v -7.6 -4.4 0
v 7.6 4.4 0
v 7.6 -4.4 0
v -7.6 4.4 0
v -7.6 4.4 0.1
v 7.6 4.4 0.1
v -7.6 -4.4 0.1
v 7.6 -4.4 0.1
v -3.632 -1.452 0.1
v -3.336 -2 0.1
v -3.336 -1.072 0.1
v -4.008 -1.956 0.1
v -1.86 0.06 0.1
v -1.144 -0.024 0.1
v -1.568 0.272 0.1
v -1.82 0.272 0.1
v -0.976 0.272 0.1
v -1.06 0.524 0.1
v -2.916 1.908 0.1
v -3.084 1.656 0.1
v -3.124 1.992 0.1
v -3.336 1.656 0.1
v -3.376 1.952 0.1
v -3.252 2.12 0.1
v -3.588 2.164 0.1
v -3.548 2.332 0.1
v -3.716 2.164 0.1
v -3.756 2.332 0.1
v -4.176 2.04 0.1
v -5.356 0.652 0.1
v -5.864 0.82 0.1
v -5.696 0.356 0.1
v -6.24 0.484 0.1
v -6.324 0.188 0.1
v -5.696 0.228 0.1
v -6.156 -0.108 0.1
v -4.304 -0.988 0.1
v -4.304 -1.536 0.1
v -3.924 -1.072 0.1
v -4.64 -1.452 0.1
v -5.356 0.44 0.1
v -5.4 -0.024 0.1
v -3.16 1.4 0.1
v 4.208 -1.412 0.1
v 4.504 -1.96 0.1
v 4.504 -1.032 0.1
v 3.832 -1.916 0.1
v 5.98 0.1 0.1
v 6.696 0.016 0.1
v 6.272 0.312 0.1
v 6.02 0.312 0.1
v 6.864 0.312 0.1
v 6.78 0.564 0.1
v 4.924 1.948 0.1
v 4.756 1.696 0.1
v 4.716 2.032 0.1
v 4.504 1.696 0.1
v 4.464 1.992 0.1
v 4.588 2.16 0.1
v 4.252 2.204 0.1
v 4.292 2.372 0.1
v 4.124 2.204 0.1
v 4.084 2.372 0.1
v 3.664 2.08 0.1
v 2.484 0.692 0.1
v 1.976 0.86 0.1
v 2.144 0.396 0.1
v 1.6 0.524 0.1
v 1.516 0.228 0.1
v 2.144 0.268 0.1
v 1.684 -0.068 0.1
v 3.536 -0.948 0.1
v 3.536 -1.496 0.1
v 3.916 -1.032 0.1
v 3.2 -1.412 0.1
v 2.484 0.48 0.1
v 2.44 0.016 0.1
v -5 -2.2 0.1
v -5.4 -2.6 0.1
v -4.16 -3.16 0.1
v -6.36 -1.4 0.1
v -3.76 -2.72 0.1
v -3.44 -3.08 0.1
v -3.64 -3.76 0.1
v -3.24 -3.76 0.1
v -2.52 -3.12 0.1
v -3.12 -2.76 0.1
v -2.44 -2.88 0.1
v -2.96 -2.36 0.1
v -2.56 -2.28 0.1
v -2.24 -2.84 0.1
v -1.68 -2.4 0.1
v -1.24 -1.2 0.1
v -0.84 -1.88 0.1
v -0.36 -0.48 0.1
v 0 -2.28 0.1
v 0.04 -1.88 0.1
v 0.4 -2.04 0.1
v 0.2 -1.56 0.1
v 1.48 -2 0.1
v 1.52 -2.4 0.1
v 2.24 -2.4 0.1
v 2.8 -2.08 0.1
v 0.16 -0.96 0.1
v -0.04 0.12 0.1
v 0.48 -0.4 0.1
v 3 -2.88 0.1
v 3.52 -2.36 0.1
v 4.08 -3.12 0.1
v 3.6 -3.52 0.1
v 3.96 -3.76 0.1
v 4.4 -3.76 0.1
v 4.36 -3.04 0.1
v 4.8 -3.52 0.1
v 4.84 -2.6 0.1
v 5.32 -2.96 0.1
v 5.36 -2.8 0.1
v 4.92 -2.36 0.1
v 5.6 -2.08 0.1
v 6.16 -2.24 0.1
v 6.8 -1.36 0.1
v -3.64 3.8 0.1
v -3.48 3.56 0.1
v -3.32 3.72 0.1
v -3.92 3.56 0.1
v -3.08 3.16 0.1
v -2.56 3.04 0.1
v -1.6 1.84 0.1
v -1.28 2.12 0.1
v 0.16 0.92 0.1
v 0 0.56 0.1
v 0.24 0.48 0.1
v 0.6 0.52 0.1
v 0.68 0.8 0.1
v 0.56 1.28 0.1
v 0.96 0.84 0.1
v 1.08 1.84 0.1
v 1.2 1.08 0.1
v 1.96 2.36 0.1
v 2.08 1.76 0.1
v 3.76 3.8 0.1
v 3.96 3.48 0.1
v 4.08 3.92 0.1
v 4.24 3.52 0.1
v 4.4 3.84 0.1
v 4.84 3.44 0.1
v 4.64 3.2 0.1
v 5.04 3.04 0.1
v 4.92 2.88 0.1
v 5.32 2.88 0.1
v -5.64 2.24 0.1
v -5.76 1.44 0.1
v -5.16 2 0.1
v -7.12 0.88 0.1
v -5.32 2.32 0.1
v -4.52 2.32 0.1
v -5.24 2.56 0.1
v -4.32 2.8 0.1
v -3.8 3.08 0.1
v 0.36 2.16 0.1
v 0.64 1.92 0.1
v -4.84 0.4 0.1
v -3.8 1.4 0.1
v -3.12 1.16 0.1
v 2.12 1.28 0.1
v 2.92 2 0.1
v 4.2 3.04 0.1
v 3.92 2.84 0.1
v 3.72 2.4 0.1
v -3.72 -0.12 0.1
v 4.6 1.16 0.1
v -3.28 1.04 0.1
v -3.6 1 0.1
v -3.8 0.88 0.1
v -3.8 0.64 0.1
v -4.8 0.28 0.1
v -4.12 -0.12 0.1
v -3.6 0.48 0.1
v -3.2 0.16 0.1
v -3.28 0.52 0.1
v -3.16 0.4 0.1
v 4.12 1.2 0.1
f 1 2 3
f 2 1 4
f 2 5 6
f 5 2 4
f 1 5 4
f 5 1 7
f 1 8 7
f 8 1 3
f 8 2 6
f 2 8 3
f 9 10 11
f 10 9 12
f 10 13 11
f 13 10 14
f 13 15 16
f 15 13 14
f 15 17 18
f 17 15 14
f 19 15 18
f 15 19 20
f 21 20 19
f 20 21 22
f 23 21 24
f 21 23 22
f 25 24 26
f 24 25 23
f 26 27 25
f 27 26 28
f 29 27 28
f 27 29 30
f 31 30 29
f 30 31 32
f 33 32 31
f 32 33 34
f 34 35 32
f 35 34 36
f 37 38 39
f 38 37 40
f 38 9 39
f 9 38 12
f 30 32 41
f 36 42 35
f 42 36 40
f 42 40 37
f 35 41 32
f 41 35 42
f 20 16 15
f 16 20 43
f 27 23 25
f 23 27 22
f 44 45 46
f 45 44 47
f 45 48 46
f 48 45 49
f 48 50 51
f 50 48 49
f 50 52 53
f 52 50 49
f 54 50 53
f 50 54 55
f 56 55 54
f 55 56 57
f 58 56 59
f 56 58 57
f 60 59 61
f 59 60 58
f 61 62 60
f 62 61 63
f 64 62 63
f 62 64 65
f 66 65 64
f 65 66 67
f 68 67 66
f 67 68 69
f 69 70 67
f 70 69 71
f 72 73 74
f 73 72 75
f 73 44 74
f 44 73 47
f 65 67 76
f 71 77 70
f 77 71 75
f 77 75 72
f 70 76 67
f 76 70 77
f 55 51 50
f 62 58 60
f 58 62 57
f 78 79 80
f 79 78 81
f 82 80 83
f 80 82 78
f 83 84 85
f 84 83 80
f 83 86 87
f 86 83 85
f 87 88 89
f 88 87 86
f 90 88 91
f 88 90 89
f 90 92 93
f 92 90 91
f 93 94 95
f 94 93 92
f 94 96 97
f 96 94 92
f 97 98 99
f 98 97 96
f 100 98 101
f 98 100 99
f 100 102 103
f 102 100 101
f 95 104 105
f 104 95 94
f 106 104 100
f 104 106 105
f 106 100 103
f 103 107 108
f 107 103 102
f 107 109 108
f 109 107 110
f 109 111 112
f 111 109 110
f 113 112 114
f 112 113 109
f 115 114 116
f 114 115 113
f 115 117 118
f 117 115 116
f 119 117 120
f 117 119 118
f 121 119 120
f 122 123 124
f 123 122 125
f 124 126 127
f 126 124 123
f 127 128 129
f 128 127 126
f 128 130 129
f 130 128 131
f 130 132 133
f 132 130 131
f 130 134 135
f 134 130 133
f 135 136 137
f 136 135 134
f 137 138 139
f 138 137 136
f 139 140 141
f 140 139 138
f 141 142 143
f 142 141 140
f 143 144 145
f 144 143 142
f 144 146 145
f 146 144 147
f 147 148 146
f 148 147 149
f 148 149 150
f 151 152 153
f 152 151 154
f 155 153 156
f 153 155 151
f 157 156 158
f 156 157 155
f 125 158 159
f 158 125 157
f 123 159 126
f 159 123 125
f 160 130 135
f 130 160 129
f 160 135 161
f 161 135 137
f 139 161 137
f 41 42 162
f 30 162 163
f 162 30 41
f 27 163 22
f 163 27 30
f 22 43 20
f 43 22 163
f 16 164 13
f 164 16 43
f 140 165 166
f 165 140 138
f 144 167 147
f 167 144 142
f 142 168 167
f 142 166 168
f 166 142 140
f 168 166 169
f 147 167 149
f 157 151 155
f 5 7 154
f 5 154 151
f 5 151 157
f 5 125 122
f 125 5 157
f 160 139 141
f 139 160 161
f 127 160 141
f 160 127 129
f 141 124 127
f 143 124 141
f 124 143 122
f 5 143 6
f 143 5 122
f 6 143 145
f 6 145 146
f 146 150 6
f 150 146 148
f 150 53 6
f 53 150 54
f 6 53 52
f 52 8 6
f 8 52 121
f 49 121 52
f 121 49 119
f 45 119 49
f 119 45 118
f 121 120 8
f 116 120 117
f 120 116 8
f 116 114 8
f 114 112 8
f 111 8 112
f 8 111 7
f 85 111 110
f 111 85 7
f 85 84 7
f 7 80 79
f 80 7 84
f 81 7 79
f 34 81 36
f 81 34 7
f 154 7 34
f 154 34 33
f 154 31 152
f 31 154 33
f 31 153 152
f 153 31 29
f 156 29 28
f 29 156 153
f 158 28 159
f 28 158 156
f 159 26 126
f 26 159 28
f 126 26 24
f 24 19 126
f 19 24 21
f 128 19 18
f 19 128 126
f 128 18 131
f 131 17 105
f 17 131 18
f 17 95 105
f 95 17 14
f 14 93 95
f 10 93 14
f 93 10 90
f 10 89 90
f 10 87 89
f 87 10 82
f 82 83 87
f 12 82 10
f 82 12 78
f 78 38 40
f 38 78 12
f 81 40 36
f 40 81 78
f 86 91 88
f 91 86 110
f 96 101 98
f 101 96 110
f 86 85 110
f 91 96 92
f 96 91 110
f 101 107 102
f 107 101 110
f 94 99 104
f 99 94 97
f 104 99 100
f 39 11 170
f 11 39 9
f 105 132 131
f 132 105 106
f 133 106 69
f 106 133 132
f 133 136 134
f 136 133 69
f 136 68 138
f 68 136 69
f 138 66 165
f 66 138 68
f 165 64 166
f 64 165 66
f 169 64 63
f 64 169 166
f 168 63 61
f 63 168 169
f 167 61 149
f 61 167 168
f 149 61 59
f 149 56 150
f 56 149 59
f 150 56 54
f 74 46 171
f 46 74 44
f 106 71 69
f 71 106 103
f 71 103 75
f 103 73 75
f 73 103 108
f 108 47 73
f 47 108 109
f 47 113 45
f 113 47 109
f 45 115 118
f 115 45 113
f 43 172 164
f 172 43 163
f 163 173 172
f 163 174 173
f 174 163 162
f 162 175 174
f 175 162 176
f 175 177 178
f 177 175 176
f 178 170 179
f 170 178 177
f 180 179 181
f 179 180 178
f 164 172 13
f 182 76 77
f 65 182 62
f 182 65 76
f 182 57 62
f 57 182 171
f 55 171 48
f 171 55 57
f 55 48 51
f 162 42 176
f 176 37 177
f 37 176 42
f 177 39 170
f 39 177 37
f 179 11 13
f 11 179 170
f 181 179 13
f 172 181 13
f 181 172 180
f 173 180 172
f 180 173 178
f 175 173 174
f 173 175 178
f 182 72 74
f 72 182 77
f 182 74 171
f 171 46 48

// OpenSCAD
// file: ../p/box5-12.scad
use <../lib.scad>
function ldraw_lib__box5_12() = [
// 0 Box with 5 Faces without Any Edges
// 0 Name: box5-12.dat
// 0 Author: Chris Dee [cwdee]
// 0 !LDRAW_ORG Primitive UPDATE 2009-02
// 0 !LICENSE Licensed under CC BY 2.0 and CC BY 4.0 : see CAreadme.txt
// 
// 0 BFC CERTIFY CCW
  [0,"BFC","CERTIFY"],
  [0,"BFC","CCW"],
// 
// 0 !HISTORY 2009-09-03 [PTadmin] Official Update 2009-02
// 
// 
// 4 16 1 1 1 1 1 -1 -1 1 -1 -1 1 1
  [4,16,1,1,1,1,1,-1,-1,1,-1,-1,1,1],
// 4 16 -1 0 1 1 0 1 1 1 1 -1 1 1
  [4,16,-1,0,1,1,0,1,1,1,1,-1,1,1],
// 4 16 -1 0 -1 -1 0 1 -1 1 1 -1 1 -1
  [4,16,-1,0,-1,-1,0,1,-1,1,1,-1,1,-1],
// 4 16 1 0 -1 -1 0 -1 -1 1 -1 1 1 -1
  [4,16,1,0,-1,-1,0,-1,-1,1,-1,1,1,-1],
// 4 16 1 0 1 1 0 -1 1 1 -1 1 1 1
  [4,16,1,0,1,1,0,-1,1,1,-1,1,1,1],
// 0
];
makepoly(ldraw_lib__box5_12(), line=0.2);
// main file
use <../lib.scad>
use <../p/box5-12.scad>
function ldraw_lib__6005724h2() = [
// 0 Sticker  1.1 x  1.9 with Diamond Bricks Type 2
// 0 Name: 6005724h2.dat
// 0 Author: Christian Neumann [Wesley]
// 0 !LDRAW_ORG Part UPDATE 2014-02
// 0 !LICENSE Licensed under CC BY 2.0 and CC BY 4.0 : see CAreadme.txt
// 
// 0 BFC CERTIFY CCW
  [0,"BFC","CERTIFY"],
  [0,"BFC","CCW"],
// 
// 0 !KEYWORDS Lord of the Rings, LOTR, Mines of Moria, Set 9473
// 
// 0 !CMDLINE -c72
// 
// 0 !HISTORY 2014-12-23 [PTadmin] Official Update 2014-02
// 
// 
// 1 16 0 -0.25 0 19 0 0 0 0.25 0 0 0 11 box5-12.dat
  [1,16,0,-0.25,0,19,0,0,0,0.25,0,0,0,11, ldraw_lib__box5_12()],
// 4 0 -9.08 -0.25 -3.63 -10.02 -0.25 -4.89 -8.34 -0.25 -5 -8.34 -0.25 -2.68
  [4,0,-9.08,-0.25,-3.63,-10.02,-0.25,-4.89,-8.34,-0.25,-5,-8.34,-0.25,-2.68],
// 4 0 -4.65 -0.25 0.15 -8.34 -0.25 -2.68 -8.34 -0.25 -5 -2.86 -0.25 -0.06
  [4,0,-4.65,-0.25,0.15,-8.34,-0.25,-2.68,-8.34,-0.25,-5,-2.86,-0.25,-0.06],
// 4 0 -4.55 -0.25 0.68 -4.65 -0.25 0.15 -2.86 -0.25 -0.06 -3.92 -0.25 0.68
  [4,0,-4.55,-0.25,0.68,-4.65,-0.25,0.15,-2.86,-0.25,-0.06,-3.92,-0.25,0.68],
// 4 0 -3.92 -0.25 0.68 -2.86 -0.25 -0.06 -2.44 -0.25 0.68 -2.65 -0.25 1.31
  [4,0,-3.92,-0.25,0.68,-2.86,-0.25,-0.06,-2.44,-0.25,0.68,-2.65,-0.25,1.31],
// 4 0 -3.92 -0.25 0.68 -2.65 -0.25 1.31 -7.29 -0.25 4.77 -7.71 -0.25 4.14
  [4,0,-3.92,-0.25,0.68,-2.65,-0.25,1.31,-7.29,-0.25,4.77,-7.71,-0.25,4.14],
// 4 0 -7.71 -0.25 4.14 -7.29 -0.25 4.77 -7.81 -0.25 4.98 -8.34 -0.25 4.14
  [4,0,-7.71,-0.25,4.14,-7.29,-0.25,4.77,-7.81,-0.25,4.98,-8.34,-0.25,4.14],
// 4 0 -8.44 -0.25 4.88 -8.34 -0.25 4.14 -7.81 -0.25 4.98 -8.13 -0.25 5.3
  [4,0,-8.44,-0.25,4.88,-8.34,-0.25,4.14,-7.81,-0.25,4.98,-8.13,-0.25,5.3],
// 4 0 -8.97 -0.25 5.41 -8.44 -0.25 4.88 -8.13 -0.25 5.3 -8.87 -0.25 5.83
  [4,0,-8.97,-0.25,5.41,-8.44,-0.25,4.88,-8.13,-0.25,5.3,-8.87,-0.25,5.83],
// 4 0 -8.97 -0.25 5.41 -8.87 -0.25 5.83 -9.39 -0.25 5.83 -9.29 -0.25 5.41
  [4,0,-8.97,-0.25,5.41,-8.87,-0.25,5.83,-9.39,-0.25,5.83,-9.29,-0.25,5.41],
// 4 0 -9.29 -0.25 5.41 -9.39 -0.25 5.83 -10.44 -0.25 5.1 -13.39 -0.25 1.63
  [4,0,-9.29,-0.25,5.41,-9.39,-0.25,5.83,-10.44,-0.25,5.1,-13.39,-0.25,1.63],
// 4 0 -13.39 -0.25 1.63 -10.44 -0.25 5.1 -14.66 -0.25 2.05 -14.24 -0.25 0.89
  [4,0,-13.39,-0.25,1.63,-10.44,-0.25,5.1,-14.66,-0.25,2.05,-14.24,-0.25,0.89],
// 4 0 -14.24 -0.25 0.89 -14.66 -0.25 2.05 -15.6 -0.25 1.21 -15.81 -0.25 0.47
  [4,0,-14.24,-0.25,0.89,-14.66,-0.25,2.05,-15.6,-0.25,1.21,-15.81,-0.25,0.47],
// 4 0 -14.24 -0.25 0.57 -14.24 -0.25 0.89 -15.81 -0.25 0.47 -15.39 -0.25 -0.27
  [4,0,-14.24,-0.25,0.57,-14.24,-0.25,0.89,-15.81,-0.25,0.47,-15.39,-0.25,-0.27],
// 4 0 -10.76 -0.25 -2.47 -11.6 -0.25 -3.63 -10.76 -0.25 -3.84 -9.81 -0.25 -2.68
  [4,0,-10.76,-0.25,-2.47,-11.6,-0.25,-3.63,-10.76,-0.25,-3.84,-9.81,-0.25,-2.68],
// 4 0 -9.81 -0.25 -2.68 -10.76 -0.25 -3.84 -10.02 -0.25 -4.89 -9.08 -0.25 -3.63
  [4,0,-9.81,-0.25,-2.68,-10.76,-0.25,-3.84,-10.02,-0.25,-4.89,-9.08,-0.25,-3.63],
// 3 0 -13.39 -0.25 1.63 -14.24 -0.25 0.89 -13.39 -0.25 1.1
  [3,0,-13.39,-0.25,1.63,-14.24,-0.25,0.89,-13.39,-0.25,1.1],
// 4 0 -13.5 -0.25 -0.06 -14.24 -0.25 0.57 -15.39 -0.25 -0.27 -11.6 -0.25 -3.63
  [4,0,-13.5,-0.25,-0.06,-14.24,-0.25,0.57,-15.39,-0.25,-0.27,-11.6,-0.25,-3.63],
// 3 0 -13.5 -0.25 -0.06 -11.6 -0.25 -3.63 -10.76 -0.25 -2.47
  [3,0,-13.5,-0.25,-0.06,-11.6,-0.25,-3.63,-10.76,-0.25,-2.47],
// 4 28 -14.24 -0.25 0.89 -14.24 -0.25 0.57 -13.5 -0.25 -0.06 -13.39 -0.25 1.1
  [4,28,-14.24,-0.25,0.89,-14.24,-0.25,0.57,-13.5,-0.25,-0.06,-13.39,-0.25,1.1],
// 4 28 -4.55 -0.25 0.68 -3.92 -0.25 0.68 -7.71 -0.25 4.14 -7.9 -0.25 3.5
  [4,28,-4.55,-0.25,0.68,-3.92,-0.25,0.68,-7.71,-0.25,4.14,-7.9,-0.25,3.5],
// 4 28 -9.29 -0.25 5.41 -8.34 -0.25 4.14 -8.44 -0.25 4.88 -8.97 -0.25 5.41
  [4,28,-9.29,-0.25,5.41,-8.34,-0.25,4.14,-8.44,-0.25,4.88,-8.97,-0.25,5.41],
// 4 0 10.52 -0.25 -3.53 9.58 -0.25 -4.79 11.26 -0.25 -4.9 11.26 -0.25 -2.58
  [4,0,10.52,-0.25,-3.53,9.58,-0.25,-4.79,11.26,-0.25,-4.9,11.26,-0.25,-2.58],
// 4 0 14.95 -0.25 0.25 11.26 -0.25 -2.58 11.26 -0.25 -4.9 16.74 -0.25 0.04
  [4,0,14.95,-0.25,0.25,11.26,-0.25,-2.58,11.26,-0.25,-4.9,16.74,-0.25,0.04],
// 4 0 15.05 -0.25 0.78 14.95 -0.25 0.25 16.74 -0.25 0.04 15.68 -0.25 0.78
  [4,0,15.05,-0.25,0.78,14.95,-0.25,0.25,16.74,-0.25,0.04,15.68,-0.25,0.78],
// 4 0 15.68 -0.25 0.78 16.74 -0.25 0.04 17.16 -0.25 0.78 16.95 -0.25 1.41
  [4,0,15.68,-0.25,0.78,16.74,-0.25,0.04,17.16,-0.25,0.78,16.95,-0.25,1.41],
// 4 0 15.68 -0.25 0.78 16.95 -0.25 1.41 12.31 -0.25 4.87 11.89 -0.25 4.24
  [4,0,15.68,-0.25,0.78,16.95,-0.25,1.41,12.31,-0.25,4.87,11.89,-0.25,4.24],
// 4 0 11.89 -0.25 4.24 12.31 -0.25 4.87 11.79 -0.25 5.08 11.26 -0.25 4.24
  [4,0,11.89,-0.25,4.24,12.31,-0.25,4.87,11.79,-0.25,5.08,11.26,-0.25,4.24],
// 4 0 11.16 -0.25 4.98 11.26 -0.25 4.24 11.79 -0.25 5.08 11.47 -0.25 5.4
  [4,0,11.16,-0.25,4.98,11.26,-0.25,4.24,11.79,-0.25,5.08,11.47,-0.25,5.4],
// 4 0 10.63 -0.25 5.51 11.16 -0.25 4.98 11.47 -0.25 5.4 10.73 -0.25 5.93
  [4,0,10.63,-0.25,5.51,11.16,-0.25,4.98,11.47,-0.25,5.4,10.73,-0.25,5.93],
// 4 0 10.63 -0.25 5.51 10.73 -0.25 5.93 10.21 -0.25 5.93 10.31 -0.25 5.51
  [4,0,10.63,-0.25,5.51,10.73,-0.25,5.93,10.21,-0.25,5.93,10.31,-0.25,5.51],
// 4 0 10.31 -0.25 5.51 10.21 -0.25 5.93 9.16 -0.25 5.2 6.21 -0.25 1.73
  [4,0,10.31,-0.25,5.51,10.21,-0.25,5.93,9.16,-0.25,5.2,6.21,-0.25,1.73],
// 4 0 6.21 -0.25 1.73 9.16 -0.25 5.2 4.94 -0.25 2.15 5.36 -0.25 0.99
  [4,0,6.21,-0.25,1.73,9.16,-0.25,5.2,4.94,-0.25,2.15,5.36,-0.25,0.99],
// 4 0 5.36 -0.25 0.99 4.94 -0.25 2.15 4 -0.25 1.31 3.79 -0.25 0.57
  [4,0,5.36,-0.25,0.99,4.94,-0.25,2.15,4,-0.25,1.31,3.79,-0.25,0.57],
// 4 0 5.36 -0.25 0.67 5.36 -0.25 0.99 3.79 -0.25 0.57 4.21 -0.25 -0.17
  [4,0,5.36,-0.25,0.67,5.36,-0.25,0.99,3.79,-0.25,0.57,4.21,-0.25,-0.17],
// 4 0 8.84 -0.25 -2.37 8 -0.25 -3.53 8.84 -0.25 -3.74 9.79 -0.25 -2.58
  [4,0,8.84,-0.25,-2.37,8,-0.25,-3.53,8.84,-0.25,-3.74,9.79,-0.25,-2.58],
// 4 0 9.79 -0.25 -2.58 8.84 -0.25 -3.74 9.58 -0.25 -4.79 10.52 -0.25 -3.53
  [4,0,9.79,-0.25,-2.58,8.84,-0.25,-3.74,9.58,-0.25,-4.79,10.52,-0.25,-3.53],
// 3 0 6.21 -0.25 1.73 5.36 -0.25 0.99 6.21 -0.25 1.2
  [3,0,6.21,-0.25,1.73,5.36,-0.25,0.99,6.21,-0.25,1.2],
// 4 0 6.1 -0.25 0.04 5.36 -0.25 0.67 4.21 -0.25 -0.17 8 -0.25 -3.53
  [4,0,6.1,-0.25,0.04,5.36,-0.25,0.67,4.21,-0.25,-0.17,8,-0.25,-3.53],
// 3 0 6.1 -0.25 0.04 8 -0.25 -3.53 8.84 -0.25 -2.37
  [3,0,6.1,-0.25,0.04,8,-0.25,-3.53,8.84,-0.25,-2.37],
// 4 28 5.36 -0.25 0.99 5.36 -0.25 0.67 6.1 -0.25 0.04 6.21 -0.25 1.2
  [4,28,5.36,-0.25,0.99,5.36,-0.25,0.67,6.1,-0.25,0.04,6.21,-0.25,1.2],
// 3 28 11.89 -0.25 4.24 15.05 -0.25 0.78 15.68 -0.25 0.78
  [3,28,11.89,-0.25,4.24,15.05,-0.25,0.78,15.68,-0.25,0.78],
// 4 28 10.31 -0.25 5.51 11.26 -0.25 4.24 11.16 -0.25 4.98 10.63 -0.25 5.51
  [4,28,10.31,-0.25,5.51,11.26,-0.25,4.24,11.16,-0.25,4.98,10.63,-0.25,5.51],
// 4 0 -12.5 -0.25 -5.5 -15.9 -0.25 -3.5 -13.5 -0.25 -6.5 -10.4 -0.25 -7.9
  [4,0,-12.5,-0.25,-5.5,-15.9,-0.25,-3.5,-13.5,-0.25,-6.5,-10.4,-0.25,-7.9],
// 4 0 -9.4 -0.25 -6.8 -12.5 -0.25 -5.5 -10.4 -0.25 -7.9 -8.6 -0.25 -7.7
  [4,0,-9.4,-0.25,-6.8,-12.5,-0.25,-5.5,-10.4,-0.25,-7.9,-8.6,-0.25,-7.7],
// 4 0 -8.6 -0.25 -7.7 -10.4 -0.25 -7.9 -9.1 -0.25 -9.4 -8.1 -0.25 -9.4
  [4,0,-8.6,-0.25,-7.7,-10.4,-0.25,-7.9,-9.1,-0.25,-9.4,-8.1,-0.25,-9.4],
// 4 0 -8.6 -0.25 -7.7 -8.1 -0.25 -9.4 -6.3 -0.25 -7.8 -7.8 -0.25 -6.9
  [4,0,-8.6,-0.25,-7.7,-8.1,-0.25,-9.4,-6.3,-0.25,-7.8,-7.8,-0.25,-6.9],
// 4 0 -7.4 -0.25 -5.9 -7.8 -0.25 -6.9 -6.3 -0.25 -7.8 -6.1 -0.25 -7.2
  [4,0,-7.4,-0.25,-5.9,-7.8,-0.25,-6.9,-6.3,-0.25,-7.8,-6.1,-0.25,-7.2],
// 4 0 -6.4 -0.25 -5.7 -7.4 -0.25 -5.9 -6.1 -0.25 -7.2 -5.6 -0.25 -7.1
  [4,0,-6.4,-0.25,-5.7,-7.4,-0.25,-5.9,-6.1,-0.25,-7.2,-5.6,-0.25,-7.1],
// 4 0 -6.4 -0.25 -5.7 -5.6 -0.25 -7.1 -4.2 -0.25 -6 -3.1 -0.25 -3
  [4,0,-6.4,-0.25,-5.7,-5.6,-0.25,-7.1,-4.2,-0.25,-6,-3.1,-0.25,-3],
// 4 0 -3.1 -0.25 -3 -4.2 -0.25 -6 -2.1 -0.25 -4.7 -0.9 -0.25 -1.2
  [4,0,-3.1,-0.25,-3,-4.2,-0.25,-6,-2.1,-0.25,-4.7,-0.9,-0.25,-1.2],
// 4 0 -2.1 -0.25 -4.7 -4.2 -0.25 -6 0 -0.25 -5.7 0.1 -0.25 -4.7
  [4,0,-2.1,-0.25,-4.7,-4.2,-0.25,-6,0,-0.25,-5.7,0.1,-0.25,-4.7],
// 4 0 0.1 -0.25 -4.7 0 -0.25 -5.7 1 -0.25 -5.1 0.5 -0.25 -3.9
  [4,0,0.1,-0.25,-4.7,0,-0.25,-5.7,1,-0.25,-5.1,0.5,-0.25,-3.9],
// 4 0 3.7 -0.25 -5 0.5 -0.25 -3.9 1 -0.25 -5.1 3.8 -0.25 -6
  [4,0,3.7,-0.25,-5,0.5,-0.25,-3.9,1,-0.25,-5.1,3.8,-0.25,-6],
// 4 0 3.7 -0.25 -5 3.8 -0.25 -6 5.6 -0.25 -6 7 -0.25 -5.2
  [4,0,3.7,-0.25,-5,3.8,-0.25,-6,5.6,-0.25,-6,7,-0.25,-5.2],
// 4 0 -0.9 -0.25 -1.2 -2.1 -0.25 -4.7 0.4 -0.25 -2.4 -0.1 -0.25 0.3
  [4,0,-0.9,-0.25,-1.2,-2.1,-0.25,-4.7,0.4,-0.25,-2.4,-0.1,-0.25,0.3],
// 4 0 1.2 -0.25 -1 -0.1 -0.25 0.3 0.4 -0.25 -2.4 3.7 -0.25 -5
  [4,0,1.2,-0.25,-1,-0.1,-0.25,0.3,0.4,-0.25,-2.4,3.7,-0.25,-5],
// 3 0 1.2 -0.25 -1 3.7 -0.25 -5 7 -0.25 -5.2
  [3,0,1.2,-0.25,-1,3.7,-0.25,-5,7,-0.25,-5.2],
// 4 0 7 -0.25 -5.2 5.6 -0.25 -6 7.5 -0.25 -7.2 8.8 -0.25 -5.9
  [4,0,7,-0.25,-5.2,5.6,-0.25,-6,7.5,-0.25,-7.2,8.8,-0.25,-5.9],
// 4 0 8.8 -0.25 -5.9 7.5 -0.25 -7.2 9 -0.25 -8.8 10.2 -0.25 -7.8
  [4,0,8.8,-0.25,-5.9,7.5,-0.25,-7.2,9,-0.25,-8.8,10.2,-0.25,-7.8],
// 4 0 10.2 -0.25 -7.8 9 -0.25 -8.8 9.9 -0.25 -9.4 11 -0.25 -9.4
  [4,0,10.2,-0.25,-7.8,9,-0.25,-8.8,9.9,-0.25,-9.4,11,-0.25,-9.4],
// 4 0 10.2 -0.25 -7.8 11 -0.25 -9.4 12 -0.25 -8.8 10.9 -0.25 -7.6
  [4,0,10.2,-0.25,-7.8,11,-0.25,-9.4,12,-0.25,-8.8,10.9,-0.25,-7.6],
// 4 0 10.9 -0.25 -7.6 12 -0.25 -8.8 13.3 -0.25 -7.4 12.1 -0.25 -6.5
  [4,0,10.9,-0.25,-7.6,12,-0.25,-8.8,13.3,-0.25,-7.4,12.1,-0.25,-6.5],
// 4 0 12.3 -0.25 -5.9 12.1 -0.25 -6.5 13.3 -0.25 -7.4 13.4 -0.25 -7
  [4,0,12.3,-0.25,-5.9,12.1,-0.25,-6.5,13.3,-0.25,-7.4,13.4,-0.25,-7],
// 4 0 14 -0.25 -5.2 12.3 -0.25 -5.9 13.4 -0.25 -7 15.4 -0.25 -5.6
  [4,0,14,-0.25,-5.2,12.3,-0.25,-5.9,13.4,-0.25,-7,15.4,-0.25,-5.6],
// 3 0 17 -0.25 -3.4 14 -0.25 -5.2 15.4 -0.25 -5.6
  [3,0,17,-0.25,-3.4,14,-0.25,-5.2,15.4,-0.25,-5.6],
// 4 0 -9.1 -0.25 9.5 -9.8 -0.25 8.9 -8.7 -0.25 8.9 -8.3 -0.25 9.3
  [4,0,-9.1,-0.25,9.5,-9.8,-0.25,8.9,-8.7,-0.25,8.9,-8.3,-0.25,9.3],
// 4 0 -8.3 -0.25 9.3 -8.7 -0.25 8.9 -7.7 -0.25 7.9 -6.4 -0.25 7.6
  [4,0,-8.3,-0.25,9.3,-8.7,-0.25,8.9,-7.7,-0.25,7.9,-6.4,-0.25,7.6],
// 4 0 -6.4 -0.25 7.6 -7.7 -0.25 7.9 -4 -0.25 4.6 -3.2 -0.25 5.3
  [4,0,-6.4,-0.25,7.6,-7.7,-0.25,7.9,-4,-0.25,4.6,-3.2,-0.25,5.3],
// 4 0 -3.2 -0.25 5.3 -4 -0.25 4.6 0 -0.25 1.4 0.4 -0.25 2.3
  [4,0,-3.2,-0.25,5.3,-4,-0.25,4.6,0,-0.25,1.4,0.4,-0.25,2.3],
// 4 0 0.4 -0.25 2.3 0 -0.25 1.4 0.6 -0.25 1.2 1.5 -0.25 1.3
  [4,0,0.4,-0.25,2.3,0,-0.25,1.4,0.6,-0.25,1.2,1.5,-0.25,1.3],
// 4 0 0.4 -0.25 2.3 1.5 -0.25 1.3 1.7 -0.25 2 1.4 -0.25 3.2
  [4,0,0.4,-0.25,2.3,1.5,-0.25,1.3,1.7,-0.25,2,1.4,-0.25,3.2],
// 4 0 1.4 -0.25 3.2 1.7 -0.25 2 2.4 -0.25 2.1 2.7 -0.25 4.6
  [4,0,1.4,-0.25,3.2,1.7,-0.25,2,2.4,-0.25,2.1,2.7,-0.25,4.6],
// 4 0 2.7 -0.25 4.6 2.4 -0.25 2.1 3 -0.25 2.7 4.9 -0.25 5.9
  [4,0,2.7,-0.25,4.6,2.4,-0.25,2.1,3,-0.25,2.7,4.9,-0.25,5.9],
// 4 0 4.9 -0.25 5.9 3 -0.25 2.7 5.2 -0.25 4.4 9.4 -0.25 9.5
  [4,0,4.9,-0.25,5.9,3,-0.25,2.7,5.2,-0.25,4.4,9.4,-0.25,9.5],
// 4 0 9.4 -0.25 9.5 5.2 -0.25 4.4 9.9 -0.25 8.7 10.2 -0.25 9.8
  [4,0,9.4,-0.25,9.5,5.2,-0.25,4.4,9.9,-0.25,8.7,10.2,-0.25,9.8],
// 4 0 10.2 -0.25 9.8 9.9 -0.25 8.7 10.6 -0.25 8.8 11 -0.25 9.6
  [4,0,10.2,-0.25,9.8,9.9,-0.25,8.7,10.6,-0.25,8.8,11,-0.25,9.6],
// 4 0 11 -0.25 9.6 10.6 -0.25 8.8 11.6 -0.25 8 12.1 -0.25 8.6
  [4,0,11,-0.25,9.6,10.6,-0.25,8.8,11.6,-0.25,8,12.1,-0.25,8.6],
// 4 0 12.1 -0.25 8.6 11.6 -0.25 8 12.3 -0.25 7.2 12.6 -0.25 7.6
  [4,0,12.1,-0.25,8.6,11.6,-0.25,8,12.3,-0.25,7.2,12.6,-0.25,7.6],
// 3 0 12.6 -0.25 7.6 12.3 -0.25 7.2 13.3 -0.25 7.2
  [3,0,12.6,-0.25,7.6,12.3,-0.25,7.2,13.3,-0.25,7.2],
// 4 15 -14.1 -0.25 5.6 -17.8 -0.25 2.2 -14.4 -0.25 3.6 -12.9 -0.25 5
  [4,15,-14.1,-0.25,5.6,-17.8,-0.25,2.2,-14.4,-0.25,3.6,-12.9,-0.25,5],
// 4 15 -13.3 -0.25 5.8 -14.1 -0.25 5.6 -12.9 -0.25 5 -11.3 -0.25 5.8
  [4,15,-13.3,-0.25,5.8,-14.1,-0.25,5.6,-12.9,-0.25,5,-11.3,-0.25,5.8],
// 4 15 -13.1 -0.25 6.4 -13.3 -0.25 5.8 -11.3 -0.25 5.8 -10.8 -0.25 7
  [4,15,-13.1,-0.25,6.4,-13.3,-0.25,5.8,-11.3,-0.25,5.8,-10.8,-0.25,7],
// 4 15 -9.8 -0.25 8.9 -13.1 -0.25 6.4 -10.8 -0.25 7 -9.5 -0.25 7.7
  [4,15,-9.8,-0.25,8.9,-13.1,-0.25,6.4,-10.8,-0.25,7,-9.5,-0.25,7.7],
// 4 15 -8.7 -0.25 8.9 -9.8 -0.25 8.9 -9.5 -0.25 7.7 -7.7 -0.25 7.9
  [4,15,-8.7,-0.25,8.9,-9.8,-0.25,8.9,-9.5,-0.25,7.7,-7.7,-0.25,7.9],
// 4 28 1.4 -0.25 3.2 0.9 -0.25 5.4 -3.2 -0.25 5.3 0.4 -0.25 2.3
  [4,28,1.4,-0.25,3.2,0.9,-0.25,5.4,-3.2,-0.25,5.3,0.4,-0.25,2.3],
// 3 28 0.9 -0.25 5.4 1.4 -0.25 3.2 1.6 -0.25 4.8
  [3,28,0.9,-0.25,5.4,1.4,-0.25,3.2,1.6,-0.25,4.8],
// 3 28 1.6 -0.25 4.8 1.4 -0.25 3.2 2.7 -0.25 4.6
  [3,28,1.6,-0.25,4.8,1.4,-0.25,3.2,2.7,-0.25,4.6],
// 3 28 4.9 -0.25 5.9 1.6 -0.25 4.8 2.7 -0.25 4.6
  [3,28,4.9,-0.25,5.9,1.6,-0.25,4.8,2.7,-0.25,4.6],
// 3 28 -13.39 -0.25 1.1 -13.5 -0.25 -0.06 -12.1 -0.25 1
  [3,28,-13.39,-0.25,1.1,-13.5,-0.25,-0.06,-12.1,-0.25,1],
// 4 28 -13.39 -0.25 1.63 -13.39 -0.25 1.1 -12.1 -0.25 1 -9.5 -0.25 3.5
  [4,28,-13.39,-0.25,1.63,-13.39,-0.25,1.1,-12.1,-0.25,1,-9.5,-0.25,3.5],
// 4 28 -9.29 -0.25 5.41 -13.39 -0.25 1.63 -9.5 -0.25 3.5 -8.34 -0.25 4.14
  [4,28,-9.29,-0.25,5.41,-13.39,-0.25,1.63,-9.5,-0.25,3.5,-8.34,-0.25,4.14],
// 4 28 -8.34 -0.25 4.14 -9.5 -0.25 3.5 -7.9 -0.25 3.5 -7.71 -0.25 4.14
  [4,28,-8.34,-0.25,4.14,-9.5,-0.25,3.5,-7.9,-0.25,3.5,-7.71,-0.25,4.14],
// 4 28 -4.55 -0.25 0.68 -7.9 -0.25 3.5 -7.8 -0.25 2.9 -4.65 -0.25 0.15
  [4,28,-4.55,-0.25,0.68,-7.9,-0.25,3.5,-7.8,-0.25,2.9,-4.65,-0.25,0.15],
// 4 28 5.2 -0.25 4.4 3 -0.25 2.7 5.3 -0.25 3.2 7.3 -0.25 5
  [4,28,5.2,-0.25,4.4,3,-0.25,2.7,5.3,-0.25,3.2,7.3,-0.25,5],
// 4 28 10.5 -0.25 7.6 11.6 -0.25 8 10.6 -0.25 8.8 9.9 -0.25 8.7
  [4,28,10.5,-0.25,7.6,11.6,-0.25,8,10.6,-0.25,8.8,9.9,-0.25,8.7],
// 3 28 9.9 -0.25 8.7 9.8 -0.25 7.1 10.5 -0.25 7.6
  [3,28,9.9,-0.25,8.7,9.8,-0.25,7.1,10.5,-0.25,7.6],
// 4 28 7.3 -0.25 5 9.8 -0.25 7.1 9.9 -0.25 8.7 5.2 -0.25 4.4
  [4,28,7.3,-0.25,5,9.8,-0.25,7.1,9.9,-0.25,8.7,5.2,-0.25,4.4],
// 3 28 9.8 -0.25 7.1 7.3 -0.25 5 9.3 -0.25 6
  [3,28,9.8,-0.25,7.1,7.3,-0.25,5,9.3,-0.25,6],
// 3 28 11.6 -0.25 8 10.5 -0.25 7.6 12.3 -0.25 7.2
  [3,28,11.6,-0.25,8,10.5,-0.25,7.6,12.3,-0.25,7.2],
// 3 15 -13.1 -0.25 6.4 -14.1 -0.25 5.6 -13.3 -0.25 5.8
  [3,15,-13.1,-0.25,6.4,-14.1,-0.25,5.6,-13.3,-0.25,5.8],
// 3 16 -19 -0.25 11 -19 -0.25 -11 -17.8 -0.25 2.2
  [3,16,-19,-0.25,11,-19,-0.25,-11,-17.8,-0.25,2.2],
// 3 16 -19 -0.25 11 -17.8 -0.25 2.2 -14.1 -0.25 5.6
  [3,16,-19,-0.25,11,-17.8,-0.25,2.2,-14.1,-0.25,5.6],
// 3 16 -19 -0.25 11 -14.1 -0.25 5.6 -13.1 -0.25 6.4
  [3,16,-19,-0.25,11,-14.1,-0.25,5.6,-13.1,-0.25,6.4],
// 4 16 -19 -0.25 11 -13.1 -0.25 6.4 -9.8 -0.25 8.9 -9.1 -0.25 9.5
  [4,16,-19,-0.25,11,-13.1,-0.25,6.4,-9.8,-0.25,8.9,-9.1,-0.25,9.5],
// 4 16 0.9 -0.25 5.4 1.6 -0.25 4.8 4.9 -0.25 5.9 9.4 -0.25 9.5
  [4,16,0.9,-0.25,5.4,1.6,-0.25,4.8,4.9,-0.25,5.9,9.4,-0.25,9.5],
// 4 16 -3.2 -0.25 5.3 0.9 -0.25 5.4 9.4 -0.25 9.5 -6.4 -0.25 7.6
  [4,16,-3.2,-0.25,5.3,0.9,-0.25,5.4,9.4,-0.25,9.5,-6.4,-0.25,7.6],
// 3 16 9.4 -0.25 9.5 -8.3 -0.25 9.3 -6.4 -0.25 7.6
  [3,16,9.4,-0.25,9.5,-8.3,-0.25,9.3,-6.4,-0.25,7.6],
// 4 16 -9.1 -0.25 9.5 -8.3 -0.25 9.3 9.4 -0.25 9.5 10.2 -0.25 9.8
  [4,16,-9.1,-0.25,9.5,-8.3,-0.25,9.3,9.4,-0.25,9.5,10.2,-0.25,9.8],
// 4 16 -9.1 -0.25 9.5 10.2 -0.25 9.8 19 -0.25 11 -19 -0.25 11
  [4,16,-9.1,-0.25,9.5,10.2,-0.25,9.8,19,-0.25,11,-19,-0.25,11],
// 3 16 19 -0.25 11 10.2 -0.25 9.8 11 -0.25 9.6
  [3,16,19,-0.25,11,10.2,-0.25,9.8,11,-0.25,9.6],
// 3 16 19 -0.25 11 11 -0.25 9.6 12.1 -0.25 8.6
  [3,16,19,-0.25,11,11,-0.25,9.6,12.1,-0.25,8.6],
// 4 16 19 -0.25 11 12.1 -0.25 8.6 12.6 -0.25 7.6 13.3 -0.25 7.2
  [4,16,19,-0.25,11,12.1,-0.25,8.6,12.6,-0.25,7.6,13.3,-0.25,7.2],
// 4 16 16.95 -0.25 1.41 19 -0.25 11 13.3 -0.25 7.2 12.31 -0.25 4.87
  [4,16,16.95,-0.25,1.41,19,-0.25,11,13.3,-0.25,7.2,12.31,-0.25,4.87],
// 3 16 19 -0.25 11 16.95 -0.25 1.41 17.16 -0.25 0.78
  [3,16,19,-0.25,11,16.95,-0.25,1.41,17.16,-0.25,0.78],
// 4 16 19 -0.25 -11 19 -0.25 11 17.16 -0.25 0.78 17 -0.25 -3.4
  [4,16,19,-0.25,-11,19,-0.25,11,17.16,-0.25,0.78,17,-0.25,-3.4],
// 4 16 17 -0.25 -3.4 17.16 -0.25 0.78 16.74 -0.25 0.04 14 -0.25 -5.2
  [4,16,17,-0.25,-3.4,17.16,-0.25,0.78,16.74,-0.25,0.04,14,-0.25,-5.2],
// 4 16 14 -0.25 -5.2 16.74 -0.25 0.04 11.26 -0.25 -4.9 12.3 -0.25 -5.9
  [4,16,14,-0.25,-5.2,16.74,-0.25,0.04,11.26,-0.25,-4.9,12.3,-0.25,-5.9],
// 3 16 17 -0.25 -3.4 15.4 -0.25 -5.6 19 -0.25 -11
  [3,16,17,-0.25,-3.4,15.4,-0.25,-5.6,19,-0.25,-11],
// 4 16 19 -0.25 -11 15.4 -0.25 -5.6 13.4 -0.25 -7 13.3 -0.25 -7.4
  [4,16,19,-0.25,-11,15.4,-0.25,-5.6,13.4,-0.25,-7,13.3,-0.25,-7.4],
// 3 16 13.3 -0.25 -7.4 12 -0.25 -8.8 19 -0.25 -11
  [3,16,13.3,-0.25,-7.4,12,-0.25,-8.8,19,-0.25,-11],
// 3 16 12 -0.25 -8.8 11 -0.25 -9.4 19 -0.25 -11
  [3,16,12,-0.25,-8.8,11,-0.25,-9.4,19,-0.25,-11],
// 4 16 19 -0.25 -11 11 -0.25 -9.4 9.9 -0.25 -9.4 -19 -0.25 -11
  [4,16,19,-0.25,-11,11,-0.25,-9.4,9.9,-0.25,-9.4,-19,-0.25,-11],
// 4 16 -8.1 -0.25 -9.4 -19 -0.25 -11 9.9 -0.25 -9.4 9 -0.25 -8.8
  [4,16,-8.1,-0.25,-9.4,-19,-0.25,-11,9.9,-0.25,-9.4,9,-0.25,-8.8],
// 3 16 -8.1 -0.25 -9.4 -9.1 -0.25 -9.4 -19 -0.25 -11
  [3,16,-8.1,-0.25,-9.4,-9.1,-0.25,-9.4,-19,-0.25,-11],
// 4 16 -19 -0.25 -11 -9.1 -0.25 -9.4 -10.4 -0.25 -7.9 -13.5 -0.25 -6.5
  [4,16,-19,-0.25,-11,-9.1,-0.25,-9.4,-10.4,-0.25,-7.9,-13.5,-0.25,-6.5],
// 3 16 -15.9 -0.25 -3.5 -19 -0.25 -11 -13.5 -0.25 -6.5
  [3,16,-15.9,-0.25,-3.5,-19,-0.25,-11,-13.5,-0.25,-6.5],
// 4 16 -19 -0.25 -11 -15.9 -0.25 -3.5 -15.39 -0.25 -0.27 -15.81 -0.25 0.47
  [4,16,-19,-0.25,-11,-15.9,-0.25,-3.5,-15.39,-0.25,-0.27,-15.81,-0.25,0.47],
// 3 16 -17.8 -0.25 2.2 -19 -0.25 -11 -15.81 -0.25 0.47
  [3,16,-17.8,-0.25,2.2,-19,-0.25,-11,-15.81,-0.25,0.47],
// 3 16 -17.8 -0.25 2.2 -15.81 -0.25 0.47 -15.6 -0.25 1.21
  [3,16,-17.8,-0.25,2.2,-15.81,-0.25,0.47,-15.6,-0.25,1.21],
// 4 16 -17.8 -0.25 2.2 -15.6 -0.25 1.21 -14.66 -0.25 2.05 -14.4 -0.25 3.6
  [4,16,-17.8,-0.25,2.2,-15.6,-0.25,1.21,-14.66,-0.25,2.05,-14.4,-0.25,3.6],
// 4 16 -14.4 -0.25 3.6 -14.66 -0.25 2.05 -10.44 -0.25 5.1 -12.9 -0.25 5
  [4,16,-14.4,-0.25,3.6,-14.66,-0.25,2.05,-10.44,-0.25,5.1,-12.9,-0.25,5],
// 4 16 -11.3 -0.25 5.8 -12.9 -0.25 5 -10.44 -0.25 5.1 -9.39 -0.25 5.83
  [4,16,-11.3,-0.25,5.8,-12.9,-0.25,5,-10.44,-0.25,5.1,-9.39,-0.25,5.83],
// 4 16 -10.8 -0.25 7 -11.3 -0.25 5.8 -9.39 -0.25 5.83 -9.5 -0.25 7.7
  [4,16,-10.8,-0.25,7,-11.3,-0.25,5.8,-9.39,-0.25,5.83,-9.5,-0.25,7.7],
// 4 16 -9.5 -0.25 7.7 -9.39 -0.25 5.83 -8.87 -0.25 5.83 -7.7 -0.25 7.9
  [4,16,-9.5,-0.25,7.7,-9.39,-0.25,5.83,-8.87,-0.25,5.83,-7.7,-0.25,7.9],
// 3 16 -7.7 -0.25 7.9 -8.87 -0.25 5.83 -8.13 -0.25 5.3
  [3,16,-7.7,-0.25,7.9,-8.87,-0.25,5.83,-8.13,-0.25,5.3],
// 4 16 -7.7 -0.25 7.9 -8.13 -0.25 5.3 -7.81 -0.25 4.98 -7.29 -0.25 4.77
  [4,16,-7.7,-0.25,7.9,-8.13,-0.25,5.3,-7.81,-0.25,4.98,-7.29,-0.25,4.77],
// 4 16 -4 -0.25 4.6 -7.7 -0.25 7.9 -7.29 -0.25 4.77 -2.65 -0.25 1.31
  [4,16,-4,-0.25,4.6,-7.7,-0.25,7.9,-7.29,-0.25,4.77,-2.65,-0.25,1.31],
// 3 16 -4 -0.25 4.6 -2.65 -0.25 1.31 0 -0.25 1.4
  [3,16,-4,-0.25,4.6,-2.65,-0.25,1.31,0,-0.25,1.4],
// 4 16 0 -0.25 1.4 -2.65 -0.25 1.31 -2.44 -0.25 0.68 -0.1 -0.25 0.3
  [4,16,0,-0.25,1.4,-2.65,-0.25,1.31,-2.44,-0.25,0.68,-0.1,-0.25,0.3],
// 4 16 -0.1 -0.25 0.3 -2.44 -0.25 0.68 -2.86 -0.25 -0.06 -0.9 -0.25 -1.2
  [4,16,-0.1,-0.25,0.3,-2.44,-0.25,0.68,-2.86,-0.25,-0.06,-0.9,-0.25,-1.2],
// 3 16 -2.86 -0.25 -0.06 -3.1 -0.25 -3 -0.9 -0.25 -1.2
  [3,16,-2.86,-0.25,-0.06,-3.1,-0.25,-3,-0.9,-0.25,-1.2],
// 4 16 -6.4 -0.25 -5.7 -3.1 -0.25 -3 -2.86 -0.25 -0.06 -8.34 -0.25 -5
  [4,16,-6.4,-0.25,-5.7,-3.1,-0.25,-3,-2.86,-0.25,-0.06,-8.34,-0.25,-5],
// 3 16 -8.34 -0.25 -5 -7.4 -0.25 -5.9 -6.4 -0.25 -5.7
  [3,16,-8.34,-0.25,-5,-7.4,-0.25,-5.9,-6.4,-0.25,-5.7],
// 4 16 -7.8 -0.25 -6.9 -7.4 -0.25 -5.9 -8.34 -0.25 -5 -9.4 -0.25 -6.8
  [4,16,-7.8,-0.25,-6.9,-7.4,-0.25,-5.9,-8.34,-0.25,-5,-9.4,-0.25,-6.8],
// 3 16 -9.4 -0.25 -6.8 -8.6 -0.25 -7.7 -7.8 -0.25 -6.9
  [3,16,-9.4,-0.25,-6.8,-8.6,-0.25,-7.7,-7.8,-0.25,-6.9],
// 4 16 -9.4 -0.25 -6.8 -8.34 -0.25 -5 -10.02 -0.25 -4.89 -12.5 -0.25 -5.5
  [4,16,-9.4,-0.25,-6.8,-8.34,-0.25,-5,-10.02,-0.25,-4.89,-12.5,-0.25,-5.5],
// 4 16 -12.5 -0.25 -5.5 -10.02 -0.25 -4.89 -10.76 -0.25 -3.84 -11.6 -0.25 -3.63
  [4,16,-12.5,-0.25,-5.5,-10.02,-0.25,-4.89,-10.76,-0.25,-3.84,-11.6,-0.25,-3.63],
// 4 16 -15.9 -0.25 -3.5 -12.5 -0.25 -5.5 -11.6 -0.25 -3.63 -15.39 -0.25 -0.27
  [4,16,-15.9,-0.25,-3.5,-12.5,-0.25,-5.5,-11.6,-0.25,-3.63,-15.39,-0.25,-0.27],
// 4 16 -5.6 -0.25 -7.1 -6.1 -0.25 -7.2 -6.3 -0.25 -7.8 9 -0.25 -8.8
  [4,16,-5.6,-0.25,-7.1,-6.1,-0.25,-7.2,-6.3,-0.25,-7.8,9,-0.25,-8.8],
// 4 16 3.8 -0.25 -6 1 -0.25 -5.1 0 -0.25 -5.7 9 -0.25 -8.8
  [4,16,3.8,-0.25,-6,1,-0.25,-5.1,0,-0.25,-5.7,9,-0.25,-8.8],
// 3 16 -6.3 -0.25 -7.8 -8.1 -0.25 -9.4 9 -0.25 -8.8
  [3,16,-6.3,-0.25,-7.8,-8.1,-0.25,-9.4,9,-0.25,-8.8],
// 4 16 -5.6 -0.25 -7.1 9 -0.25 -8.8 0 -0.25 -5.7 -4.2 -0.25 -6
  [4,16,-5.6,-0.25,-7.1,9,-0.25,-8.8,0,-0.25,-5.7,-4.2,-0.25,-6],
// 4 16 3.8 -0.25 -6 9 -0.25 -8.8 7.5 -0.25 -7.2 5.6 -0.25 -6
  [4,16,3.8,-0.25,-6,9,-0.25,-8.8,7.5,-0.25,-7.2,5.6,-0.25,-6],
// 4 16 -2.1 -0.25 -4.7 0.1 -0.25 -4.7 0.5 -0.25 -3.9 0.4 -0.25 -2.4
  [4,16,-2.1,-0.25,-4.7,0.1,-0.25,-4.7,0.5,-0.25,-3.9,0.4,-0.25,-2.4],
// 3 16 0.4 -0.25 -2.4 0.5 -0.25 -3.9 3.7 -0.25 -5
  [3,16,0.4,-0.25,-2.4,0.5,-0.25,-3.9,3.7,-0.25,-5],
// 4 16 -9.81 -0.25 -2.68 -9.08 -0.25 -3.63 -8.34 -0.25 -2.68 -9.3 -0.25 -0.3
  [4,16,-9.81,-0.25,-2.68,-9.08,-0.25,-3.63,-8.34,-0.25,-2.68,-9.3,-0.25,-0.3],
// 4 16 0.6 -0.25 1.2 0 -0.25 1.4 -0.1 -0.25 0.3 1.2 -0.25 -1
  [4,16,0.6,-0.25,1.2,0,-0.25,1.4,-0.1,-0.25,0.3,1.2,-0.25,-1],
// 4 16 1.5 -0.25 1.3 0.6 -0.25 1.2 1.2 -0.25 -1 3.79 -0.25 0.57
  [4,16,1.5,-0.25,1.3,0.6,-0.25,1.2,1.2,-0.25,-1,3.79,-0.25,0.57],
// 4 16 1.5 -0.25 1.3 3.79 -0.25 0.57 2.4 -0.25 2.1 1.7 -0.25 2
  [4,16,1.5,-0.25,1.3,3.79,-0.25,0.57,2.4,-0.25,2.1,1.7,-0.25,2],
// 4 16 2.4 -0.25 2.1 3.79 -0.25 0.57 4 -0.25 1.31 3 -0.25 2.7
  [4,16,2.4,-0.25,2.1,3.79,-0.25,0.57,4,-0.25,1.31,3,-0.25,2.7],
// 4 16 3 -0.25 2.7 4 -0.25 1.31 4.94 -0.25 2.15 5.3 -0.25 3.2
  [4,16,3,-0.25,2.7,4,-0.25,1.31,4.94,-0.25,2.15,5.3,-0.25,3.2],
// 4 16 5.3 -0.25 3.2 4.94 -0.25 2.15 9.16 -0.25 5.2 7.3 -0.25 5
  [4,16,5.3,-0.25,3.2,4.94,-0.25,2.15,9.16,-0.25,5.2,7.3,-0.25,5],
// 4 16 9.3 -0.25 6 7.3 -0.25 5 9.16 -0.25 5.2 10.21 -0.25 5.93
  [4,16,9.3,-0.25,6,7.3,-0.25,5,9.16,-0.25,5.2,10.21,-0.25,5.93],
// 4 16 9.8 -0.25 7.1 9.3 -0.25 6 10.21 -0.25 5.93 10.73 -0.25 5.93
  [4,16,9.8,-0.25,7.1,9.3,-0.25,6,10.21,-0.25,5.93,10.73,-0.25,5.93],
// 4 16 10.5 -0.25 7.6 9.8 -0.25 7.1 10.73 -0.25 5.93 12.3 -0.25 7.2
  [4,16,10.5,-0.25,7.6,9.8,-0.25,7.1,10.73,-0.25,5.93,12.3,-0.25,7.2],
// 3 16 12.3 -0.25 7.2 10.73 -0.25 5.93 11.47 -0.25 5.4
  [3,16,12.3,-0.25,7.2,10.73,-0.25,5.93,11.47,-0.25,5.4],
// 4 16 12.3 -0.25 7.2 11.47 -0.25 5.4 11.79 -0.25 5.08 13.3 -0.25 7.2
  [4,16,12.3,-0.25,7.2,11.47,-0.25,5.4,11.79,-0.25,5.08,13.3,-0.25,7.2],
// 3 16 13.3 -0.25 7.2 11.79 -0.25 5.08 12.31 -0.25 4.87
  [3,16,13.3,-0.25,7.2,11.79,-0.25,5.08,12.31,-0.25,4.87],
// 4 16 9.79 -0.25 -2.58 10.52 -0.25 -3.53 11.26 -0.25 -2.58 11.5 -0.25 2.9
  [4,16,9.79,-0.25,-2.58,10.52,-0.25,-3.53,11.26,-0.25,-2.58,11.5,-0.25,2.9],
// 4 16 4.21 -0.25 -0.17 3.79 -0.25 0.57 1.2 -0.25 -1 7 -0.25 -5.2
  [4,16,4.21,-0.25,-0.17,3.79,-0.25,0.57,1.2,-0.25,-1,7,-0.25,-5.2],
// 3 16 4.21 -0.25 -0.17 7 -0.25 -5.2 8 -0.25 -3.53
  [3,16,4.21,-0.25,-0.17,7,-0.25,-5.2,8,-0.25,-3.53],
// 4 16 8.84 -0.25 -3.74 8 -0.25 -3.53 7 -0.25 -5.2 8.8 -0.25 -5.9
  [4,16,8.84,-0.25,-3.74,8,-0.25,-3.53,7,-0.25,-5.2,8.8,-0.25,-5.9],
// 4 16 9.58 -0.25 -4.79 8.84 -0.25 -3.74 8.8 -0.25 -5.9 10.2 -0.25 -7.8
  [4,16,9.58,-0.25,-4.79,8.84,-0.25,-3.74,8.8,-0.25,-5.9,10.2,-0.25,-7.8],
// 4 16 9.58 -0.25 -4.79 10.2 -0.25 -7.8 10.9 -0.25 -7.6 11.26 -0.25 -4.9
  [4,16,9.58,-0.25,-4.79,10.2,-0.25,-7.8,10.9,-0.25,-7.6,11.26,-0.25,-4.9],
// 4 16 11.26 -0.25 -4.9 10.9 -0.25 -7.6 12.1 -0.25 -6.5 12.3 -0.25 -5.9
  [4,16,11.26,-0.25,-4.9,10.9,-0.25,-7.6,12.1,-0.25,-6.5,12.3,-0.25,-5.9],
// 4 15 -7.8 -0.25 2.9 -7.9 -0.25 3.5 -9.5 -0.25 3.5 -8.2 -0.25 2.6
  [4,15,-7.8,-0.25,2.9,-7.9,-0.25,3.5,-9.5,-0.25,3.5,-8.2,-0.25,2.6],
// 3 15 -9.5 -0.25 3.5 -9 -0.25 2.5 -8.2 -0.25 2.6
  [3,15,-9.5,-0.25,3.5,-9,-0.25,2.5,-8.2,-0.25,2.6],
// 4 15 -9.5 -0.25 2.2 -9 -0.25 2.5 -9.5 -0.25 3.5 -12.1 -0.25 1
  [4,15,-9.5,-0.25,2.2,-9,-0.25,2.5,-9.5,-0.25,3.5,-12.1,-0.25,1],
// 4 15 -9.5 -0.25 1.6 -9.5 -0.25 2.2 -12.1 -0.25 1 -12 -0.25 0.7
  [4,15,-9.5,-0.25,1.6,-9.5,-0.25,2.2,-12.1,-0.25,1,-12,-0.25,0.7],
// 4 15 -9.5 -0.25 1.6 -12 -0.25 0.7 -10.3 -0.25 -0.3 -9 -0.25 1.2
  [4,15,-9.5,-0.25,1.6,-12,-0.25,0.7,-10.3,-0.25,-0.3,-9,-0.25,1.2],
// 4 15 -9 -0.25 1.2 -10.3 -0.25 -0.3 -9.3 -0.25 -0.3 -8 -0.25 0.4
  [4,15,-9,-0.25,1.2,-10.3,-0.25,-0.3,-9.3,-0.25,-0.3,-8,-0.25,0.4],
// 4 15 -8.2 -0.25 1.3 -9 -0.25 1.2 -8 -0.25 0.4 -7.9 -0.25 1
  [4,15,-8.2,-0.25,1.3,-9,-0.25,1.2,-8,-0.25,0.4,-7.9,-0.25,1],
// 3 28 -7.8 -0.25 2.9 -8.2 -0.25 2.6 -4.65 -0.25 0.15
  [3,28,-7.8,-0.25,2.9,-8.2,-0.25,2.6,-4.65,-0.25,0.15],
// 3 28 10.3 -0.25 3 6.21 -0.25 1.2 6.1 -0.25 0.04
  [3,28,10.3,-0.25,3,6.21,-0.25,1.2,6.1,-0.25,0.04],
// 4 28 6.21 -0.25 1.73 6.21 -0.25 1.2 10.3 -0.25 3 10.31 -0.25 5.51
  [4,28,6.21,-0.25,1.73,6.21,-0.25,1.2,10.3,-0.25,3,10.31,-0.25,5.51],
// 4 28 11.26 -0.25 4.24 10.31 -0.25 5.51 10.3 -0.25 3 11.5 -0.25 2.9
  [4,28,11.26,-0.25,4.24,10.31,-0.25,5.51,10.3,-0.25,3,11.5,-0.25,2.9],
// 4 28 11.89 -0.25 4.24 11.26 -0.25 4.24 11.5 -0.25 2.9 14.95 -0.25 0.25
  [4,28,11.89,-0.25,4.24,11.26,-0.25,4.24,11.5,-0.25,2.9,14.95,-0.25,0.25],
// 3 28 11.89 -0.25 4.24 14.95 -0.25 0.25 15.05 -0.25 0.78
  [3,28,11.89,-0.25,4.24,14.95,-0.25,0.25,15.05,-0.25,0.78],
// 3 16 -12.1 -0.25 1 -13.5 -0.25 -0.06 -12 -0.25 0.7
  [3,16,-12.1,-0.25,1,-13.5,-0.25,-0.06,-12,-0.25,0.7],
// 4 16 -12 -0.25 0.7 -13.5 -0.25 -0.06 -10.76 -0.25 -2.47 -10.3 -0.25 -0.3
  [4,16,-12,-0.25,0.7,-13.5,-0.25,-0.06,-10.76,-0.25,-2.47,-10.3,-0.25,-0.3],
// 4 16 -10.3 -0.25 -0.3 -10.76 -0.25 -2.47 -9.81 -0.25 -2.68 -9.3 -0.25 -0.3
  [4,16,-10.3,-0.25,-0.3,-10.76,-0.25,-2.47,-9.81,-0.25,-2.68,-9.3,-0.25,-0.3],
// 4 16 -8 -0.25 0.4 -9.3 -0.25 -0.3 -8.34 -0.25 -2.68 -4.65 -0.25 0.15
  [4,16,-8,-0.25,0.4,-9.3,-0.25,-0.3,-8.34,-0.25,-2.68,-4.65,-0.25,0.15],
// 3 16 -7.9 -0.25 1 -8 -0.25 0.4 -4.65 -0.25 0.15
  [3,16,-7.9,-0.25,1,-8,-0.25,0.4,-4.65,-0.25,0.15],
// 4 16 -8.2 -0.25 2.6 -8.2 -0.25 1.3 -7.9 -0.25 1 -4.65 -0.25 0.15
  [4,16,-8.2,-0.25,2.6,-8.2,-0.25,1.3,-7.9,-0.25,1,-4.65,-0.25,0.15],
// 4 16 -9 -0.25 2.5 -9 -0.25 1.2 -8.2 -0.25 1.3 -8.2 -0.25 2.6
  [4,16,-9,-0.25,2.5,-9,-0.25,1.2,-8.2,-0.25,1.3,-8.2,-0.25,2.6],
// 4 16 -9.5 -0.25 2.2 -9.5 -0.25 1.6 -9 -0.25 1.2 -9 -0.25 2.5
  [4,16,-9.5,-0.25,2.2,-9.5,-0.25,1.6,-9,-0.25,1.2,-9,-0.25,2.5],
// 4 16 10.3 -0.25 3 6.1 -0.25 0.04 8.84 -0.25 -2.37 9.79 -0.25 -2.58
  [4,16,10.3,-0.25,3,6.1,-0.25,0.04,8.84,-0.25,-2.37,9.79,-0.25,-2.58],
// 3 16 10.3 -0.25 3 9.79 -0.25 -2.58 11.5 -0.25 2.9
  [3,16,10.3,-0.25,3,9.79,-0.25,-2.58,11.5,-0.25,2.9],
// 3 16 11.5 -0.25 2.9 11.26 -0.25 -2.58 14.95 -0.25 0.25
  [3,16,11.5,-0.25,2.9,11.26,-0.25,-2.58,14.95,-0.25,0.25],
];
makepoly(ldraw_lib__6005724h2(), line=0.2);
